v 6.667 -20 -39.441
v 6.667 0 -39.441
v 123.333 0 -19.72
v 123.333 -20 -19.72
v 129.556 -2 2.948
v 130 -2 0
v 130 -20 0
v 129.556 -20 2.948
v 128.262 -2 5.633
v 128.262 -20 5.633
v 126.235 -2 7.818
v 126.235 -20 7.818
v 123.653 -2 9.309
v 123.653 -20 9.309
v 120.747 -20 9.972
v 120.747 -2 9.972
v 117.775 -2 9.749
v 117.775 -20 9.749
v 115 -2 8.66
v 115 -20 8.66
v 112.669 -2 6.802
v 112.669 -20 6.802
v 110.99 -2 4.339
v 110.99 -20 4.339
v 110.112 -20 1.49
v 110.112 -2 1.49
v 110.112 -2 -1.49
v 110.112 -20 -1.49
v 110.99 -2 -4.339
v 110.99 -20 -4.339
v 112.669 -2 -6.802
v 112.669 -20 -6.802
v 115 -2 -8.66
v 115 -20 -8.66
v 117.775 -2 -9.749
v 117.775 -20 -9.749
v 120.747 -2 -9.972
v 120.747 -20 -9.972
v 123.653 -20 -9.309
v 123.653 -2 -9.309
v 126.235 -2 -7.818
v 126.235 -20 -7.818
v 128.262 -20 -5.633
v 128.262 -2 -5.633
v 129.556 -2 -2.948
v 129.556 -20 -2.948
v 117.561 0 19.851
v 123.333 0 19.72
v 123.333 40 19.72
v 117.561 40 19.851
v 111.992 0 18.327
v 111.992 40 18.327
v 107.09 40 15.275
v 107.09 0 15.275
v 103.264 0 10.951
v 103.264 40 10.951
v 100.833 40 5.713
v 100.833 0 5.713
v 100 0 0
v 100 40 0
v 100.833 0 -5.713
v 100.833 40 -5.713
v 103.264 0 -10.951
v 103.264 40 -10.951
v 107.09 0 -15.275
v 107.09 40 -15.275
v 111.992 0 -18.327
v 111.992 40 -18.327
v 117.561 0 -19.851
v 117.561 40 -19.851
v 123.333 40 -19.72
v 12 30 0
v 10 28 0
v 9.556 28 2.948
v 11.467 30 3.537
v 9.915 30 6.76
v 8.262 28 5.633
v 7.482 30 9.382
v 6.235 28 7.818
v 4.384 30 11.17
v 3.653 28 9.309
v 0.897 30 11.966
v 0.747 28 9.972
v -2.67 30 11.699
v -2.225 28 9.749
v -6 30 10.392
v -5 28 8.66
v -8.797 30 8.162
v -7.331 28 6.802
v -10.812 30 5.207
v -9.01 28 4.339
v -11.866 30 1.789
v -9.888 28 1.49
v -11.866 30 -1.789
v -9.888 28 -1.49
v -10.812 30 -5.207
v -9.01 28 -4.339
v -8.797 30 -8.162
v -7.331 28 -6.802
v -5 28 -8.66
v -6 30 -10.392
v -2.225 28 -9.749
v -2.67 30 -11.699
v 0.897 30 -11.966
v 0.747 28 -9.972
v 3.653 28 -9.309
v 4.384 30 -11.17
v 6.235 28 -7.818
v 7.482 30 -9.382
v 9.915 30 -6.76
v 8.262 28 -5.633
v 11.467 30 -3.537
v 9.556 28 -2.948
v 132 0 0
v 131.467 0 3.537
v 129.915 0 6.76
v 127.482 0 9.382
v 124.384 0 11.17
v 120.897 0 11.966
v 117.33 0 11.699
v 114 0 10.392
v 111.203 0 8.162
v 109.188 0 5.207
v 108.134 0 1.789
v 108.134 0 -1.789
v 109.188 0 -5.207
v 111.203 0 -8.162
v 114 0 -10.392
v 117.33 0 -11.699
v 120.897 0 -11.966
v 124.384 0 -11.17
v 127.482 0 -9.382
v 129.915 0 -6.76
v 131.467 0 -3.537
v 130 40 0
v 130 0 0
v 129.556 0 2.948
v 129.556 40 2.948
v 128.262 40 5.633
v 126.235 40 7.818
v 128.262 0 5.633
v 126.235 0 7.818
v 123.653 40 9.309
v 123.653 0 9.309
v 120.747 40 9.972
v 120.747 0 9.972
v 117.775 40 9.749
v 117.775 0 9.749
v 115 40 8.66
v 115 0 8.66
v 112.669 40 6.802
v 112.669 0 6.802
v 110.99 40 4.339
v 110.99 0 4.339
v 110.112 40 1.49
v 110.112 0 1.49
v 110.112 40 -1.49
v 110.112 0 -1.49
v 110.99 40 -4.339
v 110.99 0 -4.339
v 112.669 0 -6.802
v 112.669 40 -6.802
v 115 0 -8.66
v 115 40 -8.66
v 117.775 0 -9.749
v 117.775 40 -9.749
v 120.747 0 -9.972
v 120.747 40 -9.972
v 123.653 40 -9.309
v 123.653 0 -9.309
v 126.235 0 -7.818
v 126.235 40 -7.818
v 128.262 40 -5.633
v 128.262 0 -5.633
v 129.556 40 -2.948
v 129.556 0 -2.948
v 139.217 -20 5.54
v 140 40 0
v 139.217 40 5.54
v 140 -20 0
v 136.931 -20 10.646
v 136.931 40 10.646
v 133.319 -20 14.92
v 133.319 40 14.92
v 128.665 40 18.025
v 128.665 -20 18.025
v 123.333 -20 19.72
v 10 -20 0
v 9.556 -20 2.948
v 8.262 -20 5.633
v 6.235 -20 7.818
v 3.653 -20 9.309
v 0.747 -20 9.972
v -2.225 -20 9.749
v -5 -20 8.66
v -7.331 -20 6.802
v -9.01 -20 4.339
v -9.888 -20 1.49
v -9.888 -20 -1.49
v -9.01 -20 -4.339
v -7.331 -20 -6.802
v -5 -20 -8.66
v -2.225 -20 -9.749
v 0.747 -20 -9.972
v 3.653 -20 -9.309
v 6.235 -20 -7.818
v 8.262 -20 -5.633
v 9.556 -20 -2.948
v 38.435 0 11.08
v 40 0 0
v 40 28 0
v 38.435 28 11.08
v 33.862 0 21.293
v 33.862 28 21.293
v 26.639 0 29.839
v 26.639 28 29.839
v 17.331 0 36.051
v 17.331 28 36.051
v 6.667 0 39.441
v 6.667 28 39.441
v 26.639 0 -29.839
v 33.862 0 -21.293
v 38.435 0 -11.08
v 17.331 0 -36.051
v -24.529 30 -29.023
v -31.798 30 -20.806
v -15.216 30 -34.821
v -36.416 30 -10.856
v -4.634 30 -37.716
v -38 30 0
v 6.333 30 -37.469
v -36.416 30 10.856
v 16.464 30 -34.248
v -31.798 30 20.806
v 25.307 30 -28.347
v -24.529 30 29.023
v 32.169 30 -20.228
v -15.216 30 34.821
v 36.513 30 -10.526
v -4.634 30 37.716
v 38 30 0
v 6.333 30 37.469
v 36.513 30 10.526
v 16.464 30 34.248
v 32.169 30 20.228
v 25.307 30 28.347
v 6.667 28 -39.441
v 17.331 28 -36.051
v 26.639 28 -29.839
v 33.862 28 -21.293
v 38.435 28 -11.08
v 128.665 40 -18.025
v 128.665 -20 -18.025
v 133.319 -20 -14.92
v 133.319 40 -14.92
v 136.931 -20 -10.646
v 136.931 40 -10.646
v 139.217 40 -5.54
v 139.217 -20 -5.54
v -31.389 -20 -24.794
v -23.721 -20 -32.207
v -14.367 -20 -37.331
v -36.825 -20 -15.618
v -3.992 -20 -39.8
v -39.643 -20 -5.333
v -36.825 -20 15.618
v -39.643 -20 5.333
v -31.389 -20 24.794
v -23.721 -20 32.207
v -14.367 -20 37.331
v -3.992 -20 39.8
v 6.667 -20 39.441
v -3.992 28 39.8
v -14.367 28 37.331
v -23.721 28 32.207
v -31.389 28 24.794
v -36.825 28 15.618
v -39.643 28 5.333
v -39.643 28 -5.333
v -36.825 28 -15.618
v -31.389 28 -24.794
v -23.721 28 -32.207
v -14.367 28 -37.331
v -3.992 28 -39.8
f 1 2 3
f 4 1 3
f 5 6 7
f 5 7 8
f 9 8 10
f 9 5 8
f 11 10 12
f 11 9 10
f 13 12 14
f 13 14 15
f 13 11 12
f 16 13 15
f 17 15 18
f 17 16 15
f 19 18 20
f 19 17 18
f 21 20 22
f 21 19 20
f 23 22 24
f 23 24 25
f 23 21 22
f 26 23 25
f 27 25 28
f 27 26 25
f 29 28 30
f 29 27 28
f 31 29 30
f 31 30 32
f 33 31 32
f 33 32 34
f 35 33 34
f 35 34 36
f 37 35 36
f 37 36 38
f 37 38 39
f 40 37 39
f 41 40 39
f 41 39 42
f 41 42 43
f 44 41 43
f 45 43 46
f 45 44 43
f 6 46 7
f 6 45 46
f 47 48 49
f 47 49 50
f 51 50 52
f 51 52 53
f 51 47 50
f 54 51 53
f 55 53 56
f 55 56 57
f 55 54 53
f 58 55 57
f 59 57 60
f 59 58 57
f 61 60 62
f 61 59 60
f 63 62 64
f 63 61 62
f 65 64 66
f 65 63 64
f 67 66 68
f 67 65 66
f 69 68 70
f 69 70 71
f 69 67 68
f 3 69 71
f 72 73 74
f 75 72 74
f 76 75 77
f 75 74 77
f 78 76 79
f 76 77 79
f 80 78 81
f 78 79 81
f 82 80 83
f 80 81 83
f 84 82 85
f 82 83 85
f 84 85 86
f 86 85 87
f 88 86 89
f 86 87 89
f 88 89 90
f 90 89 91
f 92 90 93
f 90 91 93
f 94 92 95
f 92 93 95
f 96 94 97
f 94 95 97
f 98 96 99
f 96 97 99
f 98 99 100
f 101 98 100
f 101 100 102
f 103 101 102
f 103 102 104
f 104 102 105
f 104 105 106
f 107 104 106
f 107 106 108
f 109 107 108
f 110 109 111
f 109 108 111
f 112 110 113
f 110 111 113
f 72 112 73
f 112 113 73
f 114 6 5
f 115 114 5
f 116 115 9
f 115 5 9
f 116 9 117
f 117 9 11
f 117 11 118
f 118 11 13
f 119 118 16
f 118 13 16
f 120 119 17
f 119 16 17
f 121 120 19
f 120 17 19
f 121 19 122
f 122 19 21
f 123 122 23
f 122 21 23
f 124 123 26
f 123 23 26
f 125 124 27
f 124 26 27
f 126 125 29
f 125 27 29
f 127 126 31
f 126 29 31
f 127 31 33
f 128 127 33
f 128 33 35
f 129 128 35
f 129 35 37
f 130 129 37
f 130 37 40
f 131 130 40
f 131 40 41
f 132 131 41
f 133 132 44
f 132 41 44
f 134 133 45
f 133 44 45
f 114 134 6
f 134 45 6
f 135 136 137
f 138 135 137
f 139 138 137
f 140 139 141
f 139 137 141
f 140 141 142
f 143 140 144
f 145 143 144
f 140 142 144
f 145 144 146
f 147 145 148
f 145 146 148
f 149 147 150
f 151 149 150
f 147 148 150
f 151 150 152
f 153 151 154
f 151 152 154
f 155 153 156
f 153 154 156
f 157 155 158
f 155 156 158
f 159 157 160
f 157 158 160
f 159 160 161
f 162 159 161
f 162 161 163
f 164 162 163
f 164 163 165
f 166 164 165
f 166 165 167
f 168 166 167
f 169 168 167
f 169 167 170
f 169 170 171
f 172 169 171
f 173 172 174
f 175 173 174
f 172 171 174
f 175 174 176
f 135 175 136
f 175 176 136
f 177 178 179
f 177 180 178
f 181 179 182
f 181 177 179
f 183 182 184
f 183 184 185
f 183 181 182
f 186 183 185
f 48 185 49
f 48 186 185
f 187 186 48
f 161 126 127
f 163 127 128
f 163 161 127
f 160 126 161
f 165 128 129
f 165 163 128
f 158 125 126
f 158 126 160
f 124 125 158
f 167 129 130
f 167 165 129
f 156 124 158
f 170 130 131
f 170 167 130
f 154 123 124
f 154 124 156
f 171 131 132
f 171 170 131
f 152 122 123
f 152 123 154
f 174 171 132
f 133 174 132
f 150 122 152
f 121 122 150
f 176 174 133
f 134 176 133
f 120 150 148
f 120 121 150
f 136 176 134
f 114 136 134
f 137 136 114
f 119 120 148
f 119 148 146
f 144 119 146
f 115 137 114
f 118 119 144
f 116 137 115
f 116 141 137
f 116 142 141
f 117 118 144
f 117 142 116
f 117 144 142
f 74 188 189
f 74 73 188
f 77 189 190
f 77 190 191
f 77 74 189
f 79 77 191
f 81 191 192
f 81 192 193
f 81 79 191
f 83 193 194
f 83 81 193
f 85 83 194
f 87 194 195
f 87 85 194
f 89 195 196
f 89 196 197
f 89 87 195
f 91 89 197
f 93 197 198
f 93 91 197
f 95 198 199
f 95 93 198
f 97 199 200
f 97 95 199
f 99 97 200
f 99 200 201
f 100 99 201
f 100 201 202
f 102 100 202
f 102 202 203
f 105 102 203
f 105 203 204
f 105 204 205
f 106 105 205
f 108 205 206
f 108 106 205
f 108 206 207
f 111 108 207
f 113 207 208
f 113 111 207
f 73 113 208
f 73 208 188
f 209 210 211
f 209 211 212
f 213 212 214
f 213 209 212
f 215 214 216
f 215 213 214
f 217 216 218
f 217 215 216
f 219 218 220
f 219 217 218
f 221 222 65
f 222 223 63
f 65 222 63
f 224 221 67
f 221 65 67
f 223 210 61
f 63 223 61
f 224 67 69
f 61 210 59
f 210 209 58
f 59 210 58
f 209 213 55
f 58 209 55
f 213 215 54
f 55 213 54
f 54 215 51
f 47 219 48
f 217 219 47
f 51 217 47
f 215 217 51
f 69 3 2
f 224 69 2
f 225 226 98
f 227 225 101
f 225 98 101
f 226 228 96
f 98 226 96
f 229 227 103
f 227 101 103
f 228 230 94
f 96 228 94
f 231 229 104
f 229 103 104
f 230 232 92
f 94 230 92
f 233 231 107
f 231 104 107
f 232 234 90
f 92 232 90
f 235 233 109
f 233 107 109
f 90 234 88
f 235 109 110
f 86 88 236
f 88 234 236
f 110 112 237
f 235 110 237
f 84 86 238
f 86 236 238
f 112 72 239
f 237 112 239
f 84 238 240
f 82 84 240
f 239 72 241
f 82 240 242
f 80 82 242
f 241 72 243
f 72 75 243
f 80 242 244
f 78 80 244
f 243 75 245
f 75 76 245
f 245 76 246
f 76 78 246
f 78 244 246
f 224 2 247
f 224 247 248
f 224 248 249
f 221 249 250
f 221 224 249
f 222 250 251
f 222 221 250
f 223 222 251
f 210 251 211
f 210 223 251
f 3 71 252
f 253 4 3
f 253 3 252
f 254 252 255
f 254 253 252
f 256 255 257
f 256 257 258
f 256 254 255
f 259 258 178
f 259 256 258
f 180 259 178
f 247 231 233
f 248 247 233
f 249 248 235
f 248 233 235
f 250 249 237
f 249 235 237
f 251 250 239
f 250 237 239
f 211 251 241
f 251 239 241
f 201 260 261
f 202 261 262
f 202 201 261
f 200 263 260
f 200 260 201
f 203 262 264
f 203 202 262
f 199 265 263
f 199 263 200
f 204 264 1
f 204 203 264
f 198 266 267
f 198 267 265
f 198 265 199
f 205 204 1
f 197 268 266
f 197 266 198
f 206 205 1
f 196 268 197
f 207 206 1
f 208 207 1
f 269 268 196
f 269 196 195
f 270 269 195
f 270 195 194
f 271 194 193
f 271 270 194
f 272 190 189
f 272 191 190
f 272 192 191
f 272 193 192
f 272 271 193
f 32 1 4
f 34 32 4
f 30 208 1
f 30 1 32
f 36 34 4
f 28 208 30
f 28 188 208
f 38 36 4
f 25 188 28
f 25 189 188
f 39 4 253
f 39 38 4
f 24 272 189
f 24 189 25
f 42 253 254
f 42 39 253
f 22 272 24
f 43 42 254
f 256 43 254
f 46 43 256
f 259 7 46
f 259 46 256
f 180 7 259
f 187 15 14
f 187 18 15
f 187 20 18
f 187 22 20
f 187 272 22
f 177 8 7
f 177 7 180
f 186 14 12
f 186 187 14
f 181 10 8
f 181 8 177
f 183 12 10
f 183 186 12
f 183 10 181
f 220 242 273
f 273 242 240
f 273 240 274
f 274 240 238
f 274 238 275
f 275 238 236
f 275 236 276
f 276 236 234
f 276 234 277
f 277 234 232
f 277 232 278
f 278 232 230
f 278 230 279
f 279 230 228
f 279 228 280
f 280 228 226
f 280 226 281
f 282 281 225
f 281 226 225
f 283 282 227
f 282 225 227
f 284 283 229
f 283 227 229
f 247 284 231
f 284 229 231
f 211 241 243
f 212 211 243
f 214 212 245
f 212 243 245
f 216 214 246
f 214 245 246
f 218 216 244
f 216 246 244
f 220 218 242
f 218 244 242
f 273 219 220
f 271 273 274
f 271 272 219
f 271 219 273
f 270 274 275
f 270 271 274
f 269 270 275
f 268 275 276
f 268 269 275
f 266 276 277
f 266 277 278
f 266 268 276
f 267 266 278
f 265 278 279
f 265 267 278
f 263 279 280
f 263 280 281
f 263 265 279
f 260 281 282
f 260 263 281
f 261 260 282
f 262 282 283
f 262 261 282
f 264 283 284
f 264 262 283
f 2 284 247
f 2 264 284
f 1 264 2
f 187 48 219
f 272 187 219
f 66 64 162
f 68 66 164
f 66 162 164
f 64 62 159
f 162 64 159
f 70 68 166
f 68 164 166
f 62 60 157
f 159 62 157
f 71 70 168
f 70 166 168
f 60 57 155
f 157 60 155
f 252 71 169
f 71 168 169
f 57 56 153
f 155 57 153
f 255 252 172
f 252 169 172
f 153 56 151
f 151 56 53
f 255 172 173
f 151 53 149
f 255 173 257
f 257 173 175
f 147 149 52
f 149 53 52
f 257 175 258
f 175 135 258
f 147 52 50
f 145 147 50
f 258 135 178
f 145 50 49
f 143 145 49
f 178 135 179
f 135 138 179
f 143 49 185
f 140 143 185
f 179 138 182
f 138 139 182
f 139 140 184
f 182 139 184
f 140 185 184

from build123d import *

# Parameters (mm, degrees)
F0_R     = 10
F1_DEPTH = 20
F2_DEPTH = 30
F3_SIZE  = 2
F4_DEPTH = 40


with BuildPart() as f1:
    # F0 (on Front) → F1 (new body)
    with BuildSketch(Plane.XZ):
        with BuildLine():
            ThreePointArc((6.666667, 39.440532), (30.550505, 25.819889), (40, 0))
            ThreePointArc((40, 0), (30.550505, -25.819889), (6.666667, -39.440532))
            Line((6.666667, -39.440532), (123.333333, -19.720266))
            ThreePointArc((123.333333, -19.720266), (100, 0), (123.333333, 19.720266))
            Line((123.333333, 19.720266), (6.666667, 39.440532))
        make_face()
        with BuildLine():
            ThreePointArc((140, 0), (135.275252, 12.909944), (123.333333, 19.720266))
            ThreePointArc((123.333333, 19.720266), (100, 0), (123.333333, -19.720266))
            ThreePointArc((123.333333, -19.720266), (135.275252, -12.909944), (140, 0))
        make_face()
        with Locations((120, 0)):
            Circle(F0_R, mode=Mode.SUBTRACT)
        with BuildLine():
            ThreePointArc((6.666667, -39.440532), (30.550505, -25.819889), (40, 0))
            ThreePointArc((40, 0), (30.550505, 25.819889), (6.666667, 39.440532))
            ThreePointArc((6.666667, 39.440532), (-40, 0), (6.666667, -39.440532))
        make_face()
        Circle(F0_R, mode=Mode.SUBTRACT)
    extrude(amount=F1_DEPTH)

    # F0 (on Front) → F2 (join)
    with BuildSketch(Plane.XZ):
        with BuildLine():
            ThreePointArc((6.666667, -39.440532), (30.550505, -25.819889), (40, 0))
            ThreePointArc((40, 0), (30.550505, 25.819889), (6.666667, 39.440532))
            ThreePointArc((6.666667, 39.440532), (-40, 0), (6.666667, -39.440532))
        make_face()
        Circle(F0_R, mode=Mode.SUBTRACT)
    extrude(amount=-F2_DEPTH)

    # F3
    f3_edges = [f1.edges().sort_by_distance(p)[0] for p in [
        (-10, 30, 0),
        (-6.666667, 30, 39.440532),
        (110, 0, 0),
    ]]
    chamfer(f3_edges, length=F3_SIZE)

    # F0 (on Front) → F4 (join)
    with BuildSketch(Plane.XZ):
        with BuildLine():
            ThreePointArc((140, 0), (135.275252, 12.909944), (123.333333, 19.720266))
            ThreePointArc((123.333333, 19.720266), (100, 0), (123.333333, -19.720266))
            ThreePointArc((123.333333, -19.720266), (135.275252, -12.909944), (140, 0))
        make_face()
        with Locations((120, 0)):
            Circle(F0_R, mode=Mode.SUBTRACT)
    extrude(amount=-F4_DEPTH)


solid = f1.part
